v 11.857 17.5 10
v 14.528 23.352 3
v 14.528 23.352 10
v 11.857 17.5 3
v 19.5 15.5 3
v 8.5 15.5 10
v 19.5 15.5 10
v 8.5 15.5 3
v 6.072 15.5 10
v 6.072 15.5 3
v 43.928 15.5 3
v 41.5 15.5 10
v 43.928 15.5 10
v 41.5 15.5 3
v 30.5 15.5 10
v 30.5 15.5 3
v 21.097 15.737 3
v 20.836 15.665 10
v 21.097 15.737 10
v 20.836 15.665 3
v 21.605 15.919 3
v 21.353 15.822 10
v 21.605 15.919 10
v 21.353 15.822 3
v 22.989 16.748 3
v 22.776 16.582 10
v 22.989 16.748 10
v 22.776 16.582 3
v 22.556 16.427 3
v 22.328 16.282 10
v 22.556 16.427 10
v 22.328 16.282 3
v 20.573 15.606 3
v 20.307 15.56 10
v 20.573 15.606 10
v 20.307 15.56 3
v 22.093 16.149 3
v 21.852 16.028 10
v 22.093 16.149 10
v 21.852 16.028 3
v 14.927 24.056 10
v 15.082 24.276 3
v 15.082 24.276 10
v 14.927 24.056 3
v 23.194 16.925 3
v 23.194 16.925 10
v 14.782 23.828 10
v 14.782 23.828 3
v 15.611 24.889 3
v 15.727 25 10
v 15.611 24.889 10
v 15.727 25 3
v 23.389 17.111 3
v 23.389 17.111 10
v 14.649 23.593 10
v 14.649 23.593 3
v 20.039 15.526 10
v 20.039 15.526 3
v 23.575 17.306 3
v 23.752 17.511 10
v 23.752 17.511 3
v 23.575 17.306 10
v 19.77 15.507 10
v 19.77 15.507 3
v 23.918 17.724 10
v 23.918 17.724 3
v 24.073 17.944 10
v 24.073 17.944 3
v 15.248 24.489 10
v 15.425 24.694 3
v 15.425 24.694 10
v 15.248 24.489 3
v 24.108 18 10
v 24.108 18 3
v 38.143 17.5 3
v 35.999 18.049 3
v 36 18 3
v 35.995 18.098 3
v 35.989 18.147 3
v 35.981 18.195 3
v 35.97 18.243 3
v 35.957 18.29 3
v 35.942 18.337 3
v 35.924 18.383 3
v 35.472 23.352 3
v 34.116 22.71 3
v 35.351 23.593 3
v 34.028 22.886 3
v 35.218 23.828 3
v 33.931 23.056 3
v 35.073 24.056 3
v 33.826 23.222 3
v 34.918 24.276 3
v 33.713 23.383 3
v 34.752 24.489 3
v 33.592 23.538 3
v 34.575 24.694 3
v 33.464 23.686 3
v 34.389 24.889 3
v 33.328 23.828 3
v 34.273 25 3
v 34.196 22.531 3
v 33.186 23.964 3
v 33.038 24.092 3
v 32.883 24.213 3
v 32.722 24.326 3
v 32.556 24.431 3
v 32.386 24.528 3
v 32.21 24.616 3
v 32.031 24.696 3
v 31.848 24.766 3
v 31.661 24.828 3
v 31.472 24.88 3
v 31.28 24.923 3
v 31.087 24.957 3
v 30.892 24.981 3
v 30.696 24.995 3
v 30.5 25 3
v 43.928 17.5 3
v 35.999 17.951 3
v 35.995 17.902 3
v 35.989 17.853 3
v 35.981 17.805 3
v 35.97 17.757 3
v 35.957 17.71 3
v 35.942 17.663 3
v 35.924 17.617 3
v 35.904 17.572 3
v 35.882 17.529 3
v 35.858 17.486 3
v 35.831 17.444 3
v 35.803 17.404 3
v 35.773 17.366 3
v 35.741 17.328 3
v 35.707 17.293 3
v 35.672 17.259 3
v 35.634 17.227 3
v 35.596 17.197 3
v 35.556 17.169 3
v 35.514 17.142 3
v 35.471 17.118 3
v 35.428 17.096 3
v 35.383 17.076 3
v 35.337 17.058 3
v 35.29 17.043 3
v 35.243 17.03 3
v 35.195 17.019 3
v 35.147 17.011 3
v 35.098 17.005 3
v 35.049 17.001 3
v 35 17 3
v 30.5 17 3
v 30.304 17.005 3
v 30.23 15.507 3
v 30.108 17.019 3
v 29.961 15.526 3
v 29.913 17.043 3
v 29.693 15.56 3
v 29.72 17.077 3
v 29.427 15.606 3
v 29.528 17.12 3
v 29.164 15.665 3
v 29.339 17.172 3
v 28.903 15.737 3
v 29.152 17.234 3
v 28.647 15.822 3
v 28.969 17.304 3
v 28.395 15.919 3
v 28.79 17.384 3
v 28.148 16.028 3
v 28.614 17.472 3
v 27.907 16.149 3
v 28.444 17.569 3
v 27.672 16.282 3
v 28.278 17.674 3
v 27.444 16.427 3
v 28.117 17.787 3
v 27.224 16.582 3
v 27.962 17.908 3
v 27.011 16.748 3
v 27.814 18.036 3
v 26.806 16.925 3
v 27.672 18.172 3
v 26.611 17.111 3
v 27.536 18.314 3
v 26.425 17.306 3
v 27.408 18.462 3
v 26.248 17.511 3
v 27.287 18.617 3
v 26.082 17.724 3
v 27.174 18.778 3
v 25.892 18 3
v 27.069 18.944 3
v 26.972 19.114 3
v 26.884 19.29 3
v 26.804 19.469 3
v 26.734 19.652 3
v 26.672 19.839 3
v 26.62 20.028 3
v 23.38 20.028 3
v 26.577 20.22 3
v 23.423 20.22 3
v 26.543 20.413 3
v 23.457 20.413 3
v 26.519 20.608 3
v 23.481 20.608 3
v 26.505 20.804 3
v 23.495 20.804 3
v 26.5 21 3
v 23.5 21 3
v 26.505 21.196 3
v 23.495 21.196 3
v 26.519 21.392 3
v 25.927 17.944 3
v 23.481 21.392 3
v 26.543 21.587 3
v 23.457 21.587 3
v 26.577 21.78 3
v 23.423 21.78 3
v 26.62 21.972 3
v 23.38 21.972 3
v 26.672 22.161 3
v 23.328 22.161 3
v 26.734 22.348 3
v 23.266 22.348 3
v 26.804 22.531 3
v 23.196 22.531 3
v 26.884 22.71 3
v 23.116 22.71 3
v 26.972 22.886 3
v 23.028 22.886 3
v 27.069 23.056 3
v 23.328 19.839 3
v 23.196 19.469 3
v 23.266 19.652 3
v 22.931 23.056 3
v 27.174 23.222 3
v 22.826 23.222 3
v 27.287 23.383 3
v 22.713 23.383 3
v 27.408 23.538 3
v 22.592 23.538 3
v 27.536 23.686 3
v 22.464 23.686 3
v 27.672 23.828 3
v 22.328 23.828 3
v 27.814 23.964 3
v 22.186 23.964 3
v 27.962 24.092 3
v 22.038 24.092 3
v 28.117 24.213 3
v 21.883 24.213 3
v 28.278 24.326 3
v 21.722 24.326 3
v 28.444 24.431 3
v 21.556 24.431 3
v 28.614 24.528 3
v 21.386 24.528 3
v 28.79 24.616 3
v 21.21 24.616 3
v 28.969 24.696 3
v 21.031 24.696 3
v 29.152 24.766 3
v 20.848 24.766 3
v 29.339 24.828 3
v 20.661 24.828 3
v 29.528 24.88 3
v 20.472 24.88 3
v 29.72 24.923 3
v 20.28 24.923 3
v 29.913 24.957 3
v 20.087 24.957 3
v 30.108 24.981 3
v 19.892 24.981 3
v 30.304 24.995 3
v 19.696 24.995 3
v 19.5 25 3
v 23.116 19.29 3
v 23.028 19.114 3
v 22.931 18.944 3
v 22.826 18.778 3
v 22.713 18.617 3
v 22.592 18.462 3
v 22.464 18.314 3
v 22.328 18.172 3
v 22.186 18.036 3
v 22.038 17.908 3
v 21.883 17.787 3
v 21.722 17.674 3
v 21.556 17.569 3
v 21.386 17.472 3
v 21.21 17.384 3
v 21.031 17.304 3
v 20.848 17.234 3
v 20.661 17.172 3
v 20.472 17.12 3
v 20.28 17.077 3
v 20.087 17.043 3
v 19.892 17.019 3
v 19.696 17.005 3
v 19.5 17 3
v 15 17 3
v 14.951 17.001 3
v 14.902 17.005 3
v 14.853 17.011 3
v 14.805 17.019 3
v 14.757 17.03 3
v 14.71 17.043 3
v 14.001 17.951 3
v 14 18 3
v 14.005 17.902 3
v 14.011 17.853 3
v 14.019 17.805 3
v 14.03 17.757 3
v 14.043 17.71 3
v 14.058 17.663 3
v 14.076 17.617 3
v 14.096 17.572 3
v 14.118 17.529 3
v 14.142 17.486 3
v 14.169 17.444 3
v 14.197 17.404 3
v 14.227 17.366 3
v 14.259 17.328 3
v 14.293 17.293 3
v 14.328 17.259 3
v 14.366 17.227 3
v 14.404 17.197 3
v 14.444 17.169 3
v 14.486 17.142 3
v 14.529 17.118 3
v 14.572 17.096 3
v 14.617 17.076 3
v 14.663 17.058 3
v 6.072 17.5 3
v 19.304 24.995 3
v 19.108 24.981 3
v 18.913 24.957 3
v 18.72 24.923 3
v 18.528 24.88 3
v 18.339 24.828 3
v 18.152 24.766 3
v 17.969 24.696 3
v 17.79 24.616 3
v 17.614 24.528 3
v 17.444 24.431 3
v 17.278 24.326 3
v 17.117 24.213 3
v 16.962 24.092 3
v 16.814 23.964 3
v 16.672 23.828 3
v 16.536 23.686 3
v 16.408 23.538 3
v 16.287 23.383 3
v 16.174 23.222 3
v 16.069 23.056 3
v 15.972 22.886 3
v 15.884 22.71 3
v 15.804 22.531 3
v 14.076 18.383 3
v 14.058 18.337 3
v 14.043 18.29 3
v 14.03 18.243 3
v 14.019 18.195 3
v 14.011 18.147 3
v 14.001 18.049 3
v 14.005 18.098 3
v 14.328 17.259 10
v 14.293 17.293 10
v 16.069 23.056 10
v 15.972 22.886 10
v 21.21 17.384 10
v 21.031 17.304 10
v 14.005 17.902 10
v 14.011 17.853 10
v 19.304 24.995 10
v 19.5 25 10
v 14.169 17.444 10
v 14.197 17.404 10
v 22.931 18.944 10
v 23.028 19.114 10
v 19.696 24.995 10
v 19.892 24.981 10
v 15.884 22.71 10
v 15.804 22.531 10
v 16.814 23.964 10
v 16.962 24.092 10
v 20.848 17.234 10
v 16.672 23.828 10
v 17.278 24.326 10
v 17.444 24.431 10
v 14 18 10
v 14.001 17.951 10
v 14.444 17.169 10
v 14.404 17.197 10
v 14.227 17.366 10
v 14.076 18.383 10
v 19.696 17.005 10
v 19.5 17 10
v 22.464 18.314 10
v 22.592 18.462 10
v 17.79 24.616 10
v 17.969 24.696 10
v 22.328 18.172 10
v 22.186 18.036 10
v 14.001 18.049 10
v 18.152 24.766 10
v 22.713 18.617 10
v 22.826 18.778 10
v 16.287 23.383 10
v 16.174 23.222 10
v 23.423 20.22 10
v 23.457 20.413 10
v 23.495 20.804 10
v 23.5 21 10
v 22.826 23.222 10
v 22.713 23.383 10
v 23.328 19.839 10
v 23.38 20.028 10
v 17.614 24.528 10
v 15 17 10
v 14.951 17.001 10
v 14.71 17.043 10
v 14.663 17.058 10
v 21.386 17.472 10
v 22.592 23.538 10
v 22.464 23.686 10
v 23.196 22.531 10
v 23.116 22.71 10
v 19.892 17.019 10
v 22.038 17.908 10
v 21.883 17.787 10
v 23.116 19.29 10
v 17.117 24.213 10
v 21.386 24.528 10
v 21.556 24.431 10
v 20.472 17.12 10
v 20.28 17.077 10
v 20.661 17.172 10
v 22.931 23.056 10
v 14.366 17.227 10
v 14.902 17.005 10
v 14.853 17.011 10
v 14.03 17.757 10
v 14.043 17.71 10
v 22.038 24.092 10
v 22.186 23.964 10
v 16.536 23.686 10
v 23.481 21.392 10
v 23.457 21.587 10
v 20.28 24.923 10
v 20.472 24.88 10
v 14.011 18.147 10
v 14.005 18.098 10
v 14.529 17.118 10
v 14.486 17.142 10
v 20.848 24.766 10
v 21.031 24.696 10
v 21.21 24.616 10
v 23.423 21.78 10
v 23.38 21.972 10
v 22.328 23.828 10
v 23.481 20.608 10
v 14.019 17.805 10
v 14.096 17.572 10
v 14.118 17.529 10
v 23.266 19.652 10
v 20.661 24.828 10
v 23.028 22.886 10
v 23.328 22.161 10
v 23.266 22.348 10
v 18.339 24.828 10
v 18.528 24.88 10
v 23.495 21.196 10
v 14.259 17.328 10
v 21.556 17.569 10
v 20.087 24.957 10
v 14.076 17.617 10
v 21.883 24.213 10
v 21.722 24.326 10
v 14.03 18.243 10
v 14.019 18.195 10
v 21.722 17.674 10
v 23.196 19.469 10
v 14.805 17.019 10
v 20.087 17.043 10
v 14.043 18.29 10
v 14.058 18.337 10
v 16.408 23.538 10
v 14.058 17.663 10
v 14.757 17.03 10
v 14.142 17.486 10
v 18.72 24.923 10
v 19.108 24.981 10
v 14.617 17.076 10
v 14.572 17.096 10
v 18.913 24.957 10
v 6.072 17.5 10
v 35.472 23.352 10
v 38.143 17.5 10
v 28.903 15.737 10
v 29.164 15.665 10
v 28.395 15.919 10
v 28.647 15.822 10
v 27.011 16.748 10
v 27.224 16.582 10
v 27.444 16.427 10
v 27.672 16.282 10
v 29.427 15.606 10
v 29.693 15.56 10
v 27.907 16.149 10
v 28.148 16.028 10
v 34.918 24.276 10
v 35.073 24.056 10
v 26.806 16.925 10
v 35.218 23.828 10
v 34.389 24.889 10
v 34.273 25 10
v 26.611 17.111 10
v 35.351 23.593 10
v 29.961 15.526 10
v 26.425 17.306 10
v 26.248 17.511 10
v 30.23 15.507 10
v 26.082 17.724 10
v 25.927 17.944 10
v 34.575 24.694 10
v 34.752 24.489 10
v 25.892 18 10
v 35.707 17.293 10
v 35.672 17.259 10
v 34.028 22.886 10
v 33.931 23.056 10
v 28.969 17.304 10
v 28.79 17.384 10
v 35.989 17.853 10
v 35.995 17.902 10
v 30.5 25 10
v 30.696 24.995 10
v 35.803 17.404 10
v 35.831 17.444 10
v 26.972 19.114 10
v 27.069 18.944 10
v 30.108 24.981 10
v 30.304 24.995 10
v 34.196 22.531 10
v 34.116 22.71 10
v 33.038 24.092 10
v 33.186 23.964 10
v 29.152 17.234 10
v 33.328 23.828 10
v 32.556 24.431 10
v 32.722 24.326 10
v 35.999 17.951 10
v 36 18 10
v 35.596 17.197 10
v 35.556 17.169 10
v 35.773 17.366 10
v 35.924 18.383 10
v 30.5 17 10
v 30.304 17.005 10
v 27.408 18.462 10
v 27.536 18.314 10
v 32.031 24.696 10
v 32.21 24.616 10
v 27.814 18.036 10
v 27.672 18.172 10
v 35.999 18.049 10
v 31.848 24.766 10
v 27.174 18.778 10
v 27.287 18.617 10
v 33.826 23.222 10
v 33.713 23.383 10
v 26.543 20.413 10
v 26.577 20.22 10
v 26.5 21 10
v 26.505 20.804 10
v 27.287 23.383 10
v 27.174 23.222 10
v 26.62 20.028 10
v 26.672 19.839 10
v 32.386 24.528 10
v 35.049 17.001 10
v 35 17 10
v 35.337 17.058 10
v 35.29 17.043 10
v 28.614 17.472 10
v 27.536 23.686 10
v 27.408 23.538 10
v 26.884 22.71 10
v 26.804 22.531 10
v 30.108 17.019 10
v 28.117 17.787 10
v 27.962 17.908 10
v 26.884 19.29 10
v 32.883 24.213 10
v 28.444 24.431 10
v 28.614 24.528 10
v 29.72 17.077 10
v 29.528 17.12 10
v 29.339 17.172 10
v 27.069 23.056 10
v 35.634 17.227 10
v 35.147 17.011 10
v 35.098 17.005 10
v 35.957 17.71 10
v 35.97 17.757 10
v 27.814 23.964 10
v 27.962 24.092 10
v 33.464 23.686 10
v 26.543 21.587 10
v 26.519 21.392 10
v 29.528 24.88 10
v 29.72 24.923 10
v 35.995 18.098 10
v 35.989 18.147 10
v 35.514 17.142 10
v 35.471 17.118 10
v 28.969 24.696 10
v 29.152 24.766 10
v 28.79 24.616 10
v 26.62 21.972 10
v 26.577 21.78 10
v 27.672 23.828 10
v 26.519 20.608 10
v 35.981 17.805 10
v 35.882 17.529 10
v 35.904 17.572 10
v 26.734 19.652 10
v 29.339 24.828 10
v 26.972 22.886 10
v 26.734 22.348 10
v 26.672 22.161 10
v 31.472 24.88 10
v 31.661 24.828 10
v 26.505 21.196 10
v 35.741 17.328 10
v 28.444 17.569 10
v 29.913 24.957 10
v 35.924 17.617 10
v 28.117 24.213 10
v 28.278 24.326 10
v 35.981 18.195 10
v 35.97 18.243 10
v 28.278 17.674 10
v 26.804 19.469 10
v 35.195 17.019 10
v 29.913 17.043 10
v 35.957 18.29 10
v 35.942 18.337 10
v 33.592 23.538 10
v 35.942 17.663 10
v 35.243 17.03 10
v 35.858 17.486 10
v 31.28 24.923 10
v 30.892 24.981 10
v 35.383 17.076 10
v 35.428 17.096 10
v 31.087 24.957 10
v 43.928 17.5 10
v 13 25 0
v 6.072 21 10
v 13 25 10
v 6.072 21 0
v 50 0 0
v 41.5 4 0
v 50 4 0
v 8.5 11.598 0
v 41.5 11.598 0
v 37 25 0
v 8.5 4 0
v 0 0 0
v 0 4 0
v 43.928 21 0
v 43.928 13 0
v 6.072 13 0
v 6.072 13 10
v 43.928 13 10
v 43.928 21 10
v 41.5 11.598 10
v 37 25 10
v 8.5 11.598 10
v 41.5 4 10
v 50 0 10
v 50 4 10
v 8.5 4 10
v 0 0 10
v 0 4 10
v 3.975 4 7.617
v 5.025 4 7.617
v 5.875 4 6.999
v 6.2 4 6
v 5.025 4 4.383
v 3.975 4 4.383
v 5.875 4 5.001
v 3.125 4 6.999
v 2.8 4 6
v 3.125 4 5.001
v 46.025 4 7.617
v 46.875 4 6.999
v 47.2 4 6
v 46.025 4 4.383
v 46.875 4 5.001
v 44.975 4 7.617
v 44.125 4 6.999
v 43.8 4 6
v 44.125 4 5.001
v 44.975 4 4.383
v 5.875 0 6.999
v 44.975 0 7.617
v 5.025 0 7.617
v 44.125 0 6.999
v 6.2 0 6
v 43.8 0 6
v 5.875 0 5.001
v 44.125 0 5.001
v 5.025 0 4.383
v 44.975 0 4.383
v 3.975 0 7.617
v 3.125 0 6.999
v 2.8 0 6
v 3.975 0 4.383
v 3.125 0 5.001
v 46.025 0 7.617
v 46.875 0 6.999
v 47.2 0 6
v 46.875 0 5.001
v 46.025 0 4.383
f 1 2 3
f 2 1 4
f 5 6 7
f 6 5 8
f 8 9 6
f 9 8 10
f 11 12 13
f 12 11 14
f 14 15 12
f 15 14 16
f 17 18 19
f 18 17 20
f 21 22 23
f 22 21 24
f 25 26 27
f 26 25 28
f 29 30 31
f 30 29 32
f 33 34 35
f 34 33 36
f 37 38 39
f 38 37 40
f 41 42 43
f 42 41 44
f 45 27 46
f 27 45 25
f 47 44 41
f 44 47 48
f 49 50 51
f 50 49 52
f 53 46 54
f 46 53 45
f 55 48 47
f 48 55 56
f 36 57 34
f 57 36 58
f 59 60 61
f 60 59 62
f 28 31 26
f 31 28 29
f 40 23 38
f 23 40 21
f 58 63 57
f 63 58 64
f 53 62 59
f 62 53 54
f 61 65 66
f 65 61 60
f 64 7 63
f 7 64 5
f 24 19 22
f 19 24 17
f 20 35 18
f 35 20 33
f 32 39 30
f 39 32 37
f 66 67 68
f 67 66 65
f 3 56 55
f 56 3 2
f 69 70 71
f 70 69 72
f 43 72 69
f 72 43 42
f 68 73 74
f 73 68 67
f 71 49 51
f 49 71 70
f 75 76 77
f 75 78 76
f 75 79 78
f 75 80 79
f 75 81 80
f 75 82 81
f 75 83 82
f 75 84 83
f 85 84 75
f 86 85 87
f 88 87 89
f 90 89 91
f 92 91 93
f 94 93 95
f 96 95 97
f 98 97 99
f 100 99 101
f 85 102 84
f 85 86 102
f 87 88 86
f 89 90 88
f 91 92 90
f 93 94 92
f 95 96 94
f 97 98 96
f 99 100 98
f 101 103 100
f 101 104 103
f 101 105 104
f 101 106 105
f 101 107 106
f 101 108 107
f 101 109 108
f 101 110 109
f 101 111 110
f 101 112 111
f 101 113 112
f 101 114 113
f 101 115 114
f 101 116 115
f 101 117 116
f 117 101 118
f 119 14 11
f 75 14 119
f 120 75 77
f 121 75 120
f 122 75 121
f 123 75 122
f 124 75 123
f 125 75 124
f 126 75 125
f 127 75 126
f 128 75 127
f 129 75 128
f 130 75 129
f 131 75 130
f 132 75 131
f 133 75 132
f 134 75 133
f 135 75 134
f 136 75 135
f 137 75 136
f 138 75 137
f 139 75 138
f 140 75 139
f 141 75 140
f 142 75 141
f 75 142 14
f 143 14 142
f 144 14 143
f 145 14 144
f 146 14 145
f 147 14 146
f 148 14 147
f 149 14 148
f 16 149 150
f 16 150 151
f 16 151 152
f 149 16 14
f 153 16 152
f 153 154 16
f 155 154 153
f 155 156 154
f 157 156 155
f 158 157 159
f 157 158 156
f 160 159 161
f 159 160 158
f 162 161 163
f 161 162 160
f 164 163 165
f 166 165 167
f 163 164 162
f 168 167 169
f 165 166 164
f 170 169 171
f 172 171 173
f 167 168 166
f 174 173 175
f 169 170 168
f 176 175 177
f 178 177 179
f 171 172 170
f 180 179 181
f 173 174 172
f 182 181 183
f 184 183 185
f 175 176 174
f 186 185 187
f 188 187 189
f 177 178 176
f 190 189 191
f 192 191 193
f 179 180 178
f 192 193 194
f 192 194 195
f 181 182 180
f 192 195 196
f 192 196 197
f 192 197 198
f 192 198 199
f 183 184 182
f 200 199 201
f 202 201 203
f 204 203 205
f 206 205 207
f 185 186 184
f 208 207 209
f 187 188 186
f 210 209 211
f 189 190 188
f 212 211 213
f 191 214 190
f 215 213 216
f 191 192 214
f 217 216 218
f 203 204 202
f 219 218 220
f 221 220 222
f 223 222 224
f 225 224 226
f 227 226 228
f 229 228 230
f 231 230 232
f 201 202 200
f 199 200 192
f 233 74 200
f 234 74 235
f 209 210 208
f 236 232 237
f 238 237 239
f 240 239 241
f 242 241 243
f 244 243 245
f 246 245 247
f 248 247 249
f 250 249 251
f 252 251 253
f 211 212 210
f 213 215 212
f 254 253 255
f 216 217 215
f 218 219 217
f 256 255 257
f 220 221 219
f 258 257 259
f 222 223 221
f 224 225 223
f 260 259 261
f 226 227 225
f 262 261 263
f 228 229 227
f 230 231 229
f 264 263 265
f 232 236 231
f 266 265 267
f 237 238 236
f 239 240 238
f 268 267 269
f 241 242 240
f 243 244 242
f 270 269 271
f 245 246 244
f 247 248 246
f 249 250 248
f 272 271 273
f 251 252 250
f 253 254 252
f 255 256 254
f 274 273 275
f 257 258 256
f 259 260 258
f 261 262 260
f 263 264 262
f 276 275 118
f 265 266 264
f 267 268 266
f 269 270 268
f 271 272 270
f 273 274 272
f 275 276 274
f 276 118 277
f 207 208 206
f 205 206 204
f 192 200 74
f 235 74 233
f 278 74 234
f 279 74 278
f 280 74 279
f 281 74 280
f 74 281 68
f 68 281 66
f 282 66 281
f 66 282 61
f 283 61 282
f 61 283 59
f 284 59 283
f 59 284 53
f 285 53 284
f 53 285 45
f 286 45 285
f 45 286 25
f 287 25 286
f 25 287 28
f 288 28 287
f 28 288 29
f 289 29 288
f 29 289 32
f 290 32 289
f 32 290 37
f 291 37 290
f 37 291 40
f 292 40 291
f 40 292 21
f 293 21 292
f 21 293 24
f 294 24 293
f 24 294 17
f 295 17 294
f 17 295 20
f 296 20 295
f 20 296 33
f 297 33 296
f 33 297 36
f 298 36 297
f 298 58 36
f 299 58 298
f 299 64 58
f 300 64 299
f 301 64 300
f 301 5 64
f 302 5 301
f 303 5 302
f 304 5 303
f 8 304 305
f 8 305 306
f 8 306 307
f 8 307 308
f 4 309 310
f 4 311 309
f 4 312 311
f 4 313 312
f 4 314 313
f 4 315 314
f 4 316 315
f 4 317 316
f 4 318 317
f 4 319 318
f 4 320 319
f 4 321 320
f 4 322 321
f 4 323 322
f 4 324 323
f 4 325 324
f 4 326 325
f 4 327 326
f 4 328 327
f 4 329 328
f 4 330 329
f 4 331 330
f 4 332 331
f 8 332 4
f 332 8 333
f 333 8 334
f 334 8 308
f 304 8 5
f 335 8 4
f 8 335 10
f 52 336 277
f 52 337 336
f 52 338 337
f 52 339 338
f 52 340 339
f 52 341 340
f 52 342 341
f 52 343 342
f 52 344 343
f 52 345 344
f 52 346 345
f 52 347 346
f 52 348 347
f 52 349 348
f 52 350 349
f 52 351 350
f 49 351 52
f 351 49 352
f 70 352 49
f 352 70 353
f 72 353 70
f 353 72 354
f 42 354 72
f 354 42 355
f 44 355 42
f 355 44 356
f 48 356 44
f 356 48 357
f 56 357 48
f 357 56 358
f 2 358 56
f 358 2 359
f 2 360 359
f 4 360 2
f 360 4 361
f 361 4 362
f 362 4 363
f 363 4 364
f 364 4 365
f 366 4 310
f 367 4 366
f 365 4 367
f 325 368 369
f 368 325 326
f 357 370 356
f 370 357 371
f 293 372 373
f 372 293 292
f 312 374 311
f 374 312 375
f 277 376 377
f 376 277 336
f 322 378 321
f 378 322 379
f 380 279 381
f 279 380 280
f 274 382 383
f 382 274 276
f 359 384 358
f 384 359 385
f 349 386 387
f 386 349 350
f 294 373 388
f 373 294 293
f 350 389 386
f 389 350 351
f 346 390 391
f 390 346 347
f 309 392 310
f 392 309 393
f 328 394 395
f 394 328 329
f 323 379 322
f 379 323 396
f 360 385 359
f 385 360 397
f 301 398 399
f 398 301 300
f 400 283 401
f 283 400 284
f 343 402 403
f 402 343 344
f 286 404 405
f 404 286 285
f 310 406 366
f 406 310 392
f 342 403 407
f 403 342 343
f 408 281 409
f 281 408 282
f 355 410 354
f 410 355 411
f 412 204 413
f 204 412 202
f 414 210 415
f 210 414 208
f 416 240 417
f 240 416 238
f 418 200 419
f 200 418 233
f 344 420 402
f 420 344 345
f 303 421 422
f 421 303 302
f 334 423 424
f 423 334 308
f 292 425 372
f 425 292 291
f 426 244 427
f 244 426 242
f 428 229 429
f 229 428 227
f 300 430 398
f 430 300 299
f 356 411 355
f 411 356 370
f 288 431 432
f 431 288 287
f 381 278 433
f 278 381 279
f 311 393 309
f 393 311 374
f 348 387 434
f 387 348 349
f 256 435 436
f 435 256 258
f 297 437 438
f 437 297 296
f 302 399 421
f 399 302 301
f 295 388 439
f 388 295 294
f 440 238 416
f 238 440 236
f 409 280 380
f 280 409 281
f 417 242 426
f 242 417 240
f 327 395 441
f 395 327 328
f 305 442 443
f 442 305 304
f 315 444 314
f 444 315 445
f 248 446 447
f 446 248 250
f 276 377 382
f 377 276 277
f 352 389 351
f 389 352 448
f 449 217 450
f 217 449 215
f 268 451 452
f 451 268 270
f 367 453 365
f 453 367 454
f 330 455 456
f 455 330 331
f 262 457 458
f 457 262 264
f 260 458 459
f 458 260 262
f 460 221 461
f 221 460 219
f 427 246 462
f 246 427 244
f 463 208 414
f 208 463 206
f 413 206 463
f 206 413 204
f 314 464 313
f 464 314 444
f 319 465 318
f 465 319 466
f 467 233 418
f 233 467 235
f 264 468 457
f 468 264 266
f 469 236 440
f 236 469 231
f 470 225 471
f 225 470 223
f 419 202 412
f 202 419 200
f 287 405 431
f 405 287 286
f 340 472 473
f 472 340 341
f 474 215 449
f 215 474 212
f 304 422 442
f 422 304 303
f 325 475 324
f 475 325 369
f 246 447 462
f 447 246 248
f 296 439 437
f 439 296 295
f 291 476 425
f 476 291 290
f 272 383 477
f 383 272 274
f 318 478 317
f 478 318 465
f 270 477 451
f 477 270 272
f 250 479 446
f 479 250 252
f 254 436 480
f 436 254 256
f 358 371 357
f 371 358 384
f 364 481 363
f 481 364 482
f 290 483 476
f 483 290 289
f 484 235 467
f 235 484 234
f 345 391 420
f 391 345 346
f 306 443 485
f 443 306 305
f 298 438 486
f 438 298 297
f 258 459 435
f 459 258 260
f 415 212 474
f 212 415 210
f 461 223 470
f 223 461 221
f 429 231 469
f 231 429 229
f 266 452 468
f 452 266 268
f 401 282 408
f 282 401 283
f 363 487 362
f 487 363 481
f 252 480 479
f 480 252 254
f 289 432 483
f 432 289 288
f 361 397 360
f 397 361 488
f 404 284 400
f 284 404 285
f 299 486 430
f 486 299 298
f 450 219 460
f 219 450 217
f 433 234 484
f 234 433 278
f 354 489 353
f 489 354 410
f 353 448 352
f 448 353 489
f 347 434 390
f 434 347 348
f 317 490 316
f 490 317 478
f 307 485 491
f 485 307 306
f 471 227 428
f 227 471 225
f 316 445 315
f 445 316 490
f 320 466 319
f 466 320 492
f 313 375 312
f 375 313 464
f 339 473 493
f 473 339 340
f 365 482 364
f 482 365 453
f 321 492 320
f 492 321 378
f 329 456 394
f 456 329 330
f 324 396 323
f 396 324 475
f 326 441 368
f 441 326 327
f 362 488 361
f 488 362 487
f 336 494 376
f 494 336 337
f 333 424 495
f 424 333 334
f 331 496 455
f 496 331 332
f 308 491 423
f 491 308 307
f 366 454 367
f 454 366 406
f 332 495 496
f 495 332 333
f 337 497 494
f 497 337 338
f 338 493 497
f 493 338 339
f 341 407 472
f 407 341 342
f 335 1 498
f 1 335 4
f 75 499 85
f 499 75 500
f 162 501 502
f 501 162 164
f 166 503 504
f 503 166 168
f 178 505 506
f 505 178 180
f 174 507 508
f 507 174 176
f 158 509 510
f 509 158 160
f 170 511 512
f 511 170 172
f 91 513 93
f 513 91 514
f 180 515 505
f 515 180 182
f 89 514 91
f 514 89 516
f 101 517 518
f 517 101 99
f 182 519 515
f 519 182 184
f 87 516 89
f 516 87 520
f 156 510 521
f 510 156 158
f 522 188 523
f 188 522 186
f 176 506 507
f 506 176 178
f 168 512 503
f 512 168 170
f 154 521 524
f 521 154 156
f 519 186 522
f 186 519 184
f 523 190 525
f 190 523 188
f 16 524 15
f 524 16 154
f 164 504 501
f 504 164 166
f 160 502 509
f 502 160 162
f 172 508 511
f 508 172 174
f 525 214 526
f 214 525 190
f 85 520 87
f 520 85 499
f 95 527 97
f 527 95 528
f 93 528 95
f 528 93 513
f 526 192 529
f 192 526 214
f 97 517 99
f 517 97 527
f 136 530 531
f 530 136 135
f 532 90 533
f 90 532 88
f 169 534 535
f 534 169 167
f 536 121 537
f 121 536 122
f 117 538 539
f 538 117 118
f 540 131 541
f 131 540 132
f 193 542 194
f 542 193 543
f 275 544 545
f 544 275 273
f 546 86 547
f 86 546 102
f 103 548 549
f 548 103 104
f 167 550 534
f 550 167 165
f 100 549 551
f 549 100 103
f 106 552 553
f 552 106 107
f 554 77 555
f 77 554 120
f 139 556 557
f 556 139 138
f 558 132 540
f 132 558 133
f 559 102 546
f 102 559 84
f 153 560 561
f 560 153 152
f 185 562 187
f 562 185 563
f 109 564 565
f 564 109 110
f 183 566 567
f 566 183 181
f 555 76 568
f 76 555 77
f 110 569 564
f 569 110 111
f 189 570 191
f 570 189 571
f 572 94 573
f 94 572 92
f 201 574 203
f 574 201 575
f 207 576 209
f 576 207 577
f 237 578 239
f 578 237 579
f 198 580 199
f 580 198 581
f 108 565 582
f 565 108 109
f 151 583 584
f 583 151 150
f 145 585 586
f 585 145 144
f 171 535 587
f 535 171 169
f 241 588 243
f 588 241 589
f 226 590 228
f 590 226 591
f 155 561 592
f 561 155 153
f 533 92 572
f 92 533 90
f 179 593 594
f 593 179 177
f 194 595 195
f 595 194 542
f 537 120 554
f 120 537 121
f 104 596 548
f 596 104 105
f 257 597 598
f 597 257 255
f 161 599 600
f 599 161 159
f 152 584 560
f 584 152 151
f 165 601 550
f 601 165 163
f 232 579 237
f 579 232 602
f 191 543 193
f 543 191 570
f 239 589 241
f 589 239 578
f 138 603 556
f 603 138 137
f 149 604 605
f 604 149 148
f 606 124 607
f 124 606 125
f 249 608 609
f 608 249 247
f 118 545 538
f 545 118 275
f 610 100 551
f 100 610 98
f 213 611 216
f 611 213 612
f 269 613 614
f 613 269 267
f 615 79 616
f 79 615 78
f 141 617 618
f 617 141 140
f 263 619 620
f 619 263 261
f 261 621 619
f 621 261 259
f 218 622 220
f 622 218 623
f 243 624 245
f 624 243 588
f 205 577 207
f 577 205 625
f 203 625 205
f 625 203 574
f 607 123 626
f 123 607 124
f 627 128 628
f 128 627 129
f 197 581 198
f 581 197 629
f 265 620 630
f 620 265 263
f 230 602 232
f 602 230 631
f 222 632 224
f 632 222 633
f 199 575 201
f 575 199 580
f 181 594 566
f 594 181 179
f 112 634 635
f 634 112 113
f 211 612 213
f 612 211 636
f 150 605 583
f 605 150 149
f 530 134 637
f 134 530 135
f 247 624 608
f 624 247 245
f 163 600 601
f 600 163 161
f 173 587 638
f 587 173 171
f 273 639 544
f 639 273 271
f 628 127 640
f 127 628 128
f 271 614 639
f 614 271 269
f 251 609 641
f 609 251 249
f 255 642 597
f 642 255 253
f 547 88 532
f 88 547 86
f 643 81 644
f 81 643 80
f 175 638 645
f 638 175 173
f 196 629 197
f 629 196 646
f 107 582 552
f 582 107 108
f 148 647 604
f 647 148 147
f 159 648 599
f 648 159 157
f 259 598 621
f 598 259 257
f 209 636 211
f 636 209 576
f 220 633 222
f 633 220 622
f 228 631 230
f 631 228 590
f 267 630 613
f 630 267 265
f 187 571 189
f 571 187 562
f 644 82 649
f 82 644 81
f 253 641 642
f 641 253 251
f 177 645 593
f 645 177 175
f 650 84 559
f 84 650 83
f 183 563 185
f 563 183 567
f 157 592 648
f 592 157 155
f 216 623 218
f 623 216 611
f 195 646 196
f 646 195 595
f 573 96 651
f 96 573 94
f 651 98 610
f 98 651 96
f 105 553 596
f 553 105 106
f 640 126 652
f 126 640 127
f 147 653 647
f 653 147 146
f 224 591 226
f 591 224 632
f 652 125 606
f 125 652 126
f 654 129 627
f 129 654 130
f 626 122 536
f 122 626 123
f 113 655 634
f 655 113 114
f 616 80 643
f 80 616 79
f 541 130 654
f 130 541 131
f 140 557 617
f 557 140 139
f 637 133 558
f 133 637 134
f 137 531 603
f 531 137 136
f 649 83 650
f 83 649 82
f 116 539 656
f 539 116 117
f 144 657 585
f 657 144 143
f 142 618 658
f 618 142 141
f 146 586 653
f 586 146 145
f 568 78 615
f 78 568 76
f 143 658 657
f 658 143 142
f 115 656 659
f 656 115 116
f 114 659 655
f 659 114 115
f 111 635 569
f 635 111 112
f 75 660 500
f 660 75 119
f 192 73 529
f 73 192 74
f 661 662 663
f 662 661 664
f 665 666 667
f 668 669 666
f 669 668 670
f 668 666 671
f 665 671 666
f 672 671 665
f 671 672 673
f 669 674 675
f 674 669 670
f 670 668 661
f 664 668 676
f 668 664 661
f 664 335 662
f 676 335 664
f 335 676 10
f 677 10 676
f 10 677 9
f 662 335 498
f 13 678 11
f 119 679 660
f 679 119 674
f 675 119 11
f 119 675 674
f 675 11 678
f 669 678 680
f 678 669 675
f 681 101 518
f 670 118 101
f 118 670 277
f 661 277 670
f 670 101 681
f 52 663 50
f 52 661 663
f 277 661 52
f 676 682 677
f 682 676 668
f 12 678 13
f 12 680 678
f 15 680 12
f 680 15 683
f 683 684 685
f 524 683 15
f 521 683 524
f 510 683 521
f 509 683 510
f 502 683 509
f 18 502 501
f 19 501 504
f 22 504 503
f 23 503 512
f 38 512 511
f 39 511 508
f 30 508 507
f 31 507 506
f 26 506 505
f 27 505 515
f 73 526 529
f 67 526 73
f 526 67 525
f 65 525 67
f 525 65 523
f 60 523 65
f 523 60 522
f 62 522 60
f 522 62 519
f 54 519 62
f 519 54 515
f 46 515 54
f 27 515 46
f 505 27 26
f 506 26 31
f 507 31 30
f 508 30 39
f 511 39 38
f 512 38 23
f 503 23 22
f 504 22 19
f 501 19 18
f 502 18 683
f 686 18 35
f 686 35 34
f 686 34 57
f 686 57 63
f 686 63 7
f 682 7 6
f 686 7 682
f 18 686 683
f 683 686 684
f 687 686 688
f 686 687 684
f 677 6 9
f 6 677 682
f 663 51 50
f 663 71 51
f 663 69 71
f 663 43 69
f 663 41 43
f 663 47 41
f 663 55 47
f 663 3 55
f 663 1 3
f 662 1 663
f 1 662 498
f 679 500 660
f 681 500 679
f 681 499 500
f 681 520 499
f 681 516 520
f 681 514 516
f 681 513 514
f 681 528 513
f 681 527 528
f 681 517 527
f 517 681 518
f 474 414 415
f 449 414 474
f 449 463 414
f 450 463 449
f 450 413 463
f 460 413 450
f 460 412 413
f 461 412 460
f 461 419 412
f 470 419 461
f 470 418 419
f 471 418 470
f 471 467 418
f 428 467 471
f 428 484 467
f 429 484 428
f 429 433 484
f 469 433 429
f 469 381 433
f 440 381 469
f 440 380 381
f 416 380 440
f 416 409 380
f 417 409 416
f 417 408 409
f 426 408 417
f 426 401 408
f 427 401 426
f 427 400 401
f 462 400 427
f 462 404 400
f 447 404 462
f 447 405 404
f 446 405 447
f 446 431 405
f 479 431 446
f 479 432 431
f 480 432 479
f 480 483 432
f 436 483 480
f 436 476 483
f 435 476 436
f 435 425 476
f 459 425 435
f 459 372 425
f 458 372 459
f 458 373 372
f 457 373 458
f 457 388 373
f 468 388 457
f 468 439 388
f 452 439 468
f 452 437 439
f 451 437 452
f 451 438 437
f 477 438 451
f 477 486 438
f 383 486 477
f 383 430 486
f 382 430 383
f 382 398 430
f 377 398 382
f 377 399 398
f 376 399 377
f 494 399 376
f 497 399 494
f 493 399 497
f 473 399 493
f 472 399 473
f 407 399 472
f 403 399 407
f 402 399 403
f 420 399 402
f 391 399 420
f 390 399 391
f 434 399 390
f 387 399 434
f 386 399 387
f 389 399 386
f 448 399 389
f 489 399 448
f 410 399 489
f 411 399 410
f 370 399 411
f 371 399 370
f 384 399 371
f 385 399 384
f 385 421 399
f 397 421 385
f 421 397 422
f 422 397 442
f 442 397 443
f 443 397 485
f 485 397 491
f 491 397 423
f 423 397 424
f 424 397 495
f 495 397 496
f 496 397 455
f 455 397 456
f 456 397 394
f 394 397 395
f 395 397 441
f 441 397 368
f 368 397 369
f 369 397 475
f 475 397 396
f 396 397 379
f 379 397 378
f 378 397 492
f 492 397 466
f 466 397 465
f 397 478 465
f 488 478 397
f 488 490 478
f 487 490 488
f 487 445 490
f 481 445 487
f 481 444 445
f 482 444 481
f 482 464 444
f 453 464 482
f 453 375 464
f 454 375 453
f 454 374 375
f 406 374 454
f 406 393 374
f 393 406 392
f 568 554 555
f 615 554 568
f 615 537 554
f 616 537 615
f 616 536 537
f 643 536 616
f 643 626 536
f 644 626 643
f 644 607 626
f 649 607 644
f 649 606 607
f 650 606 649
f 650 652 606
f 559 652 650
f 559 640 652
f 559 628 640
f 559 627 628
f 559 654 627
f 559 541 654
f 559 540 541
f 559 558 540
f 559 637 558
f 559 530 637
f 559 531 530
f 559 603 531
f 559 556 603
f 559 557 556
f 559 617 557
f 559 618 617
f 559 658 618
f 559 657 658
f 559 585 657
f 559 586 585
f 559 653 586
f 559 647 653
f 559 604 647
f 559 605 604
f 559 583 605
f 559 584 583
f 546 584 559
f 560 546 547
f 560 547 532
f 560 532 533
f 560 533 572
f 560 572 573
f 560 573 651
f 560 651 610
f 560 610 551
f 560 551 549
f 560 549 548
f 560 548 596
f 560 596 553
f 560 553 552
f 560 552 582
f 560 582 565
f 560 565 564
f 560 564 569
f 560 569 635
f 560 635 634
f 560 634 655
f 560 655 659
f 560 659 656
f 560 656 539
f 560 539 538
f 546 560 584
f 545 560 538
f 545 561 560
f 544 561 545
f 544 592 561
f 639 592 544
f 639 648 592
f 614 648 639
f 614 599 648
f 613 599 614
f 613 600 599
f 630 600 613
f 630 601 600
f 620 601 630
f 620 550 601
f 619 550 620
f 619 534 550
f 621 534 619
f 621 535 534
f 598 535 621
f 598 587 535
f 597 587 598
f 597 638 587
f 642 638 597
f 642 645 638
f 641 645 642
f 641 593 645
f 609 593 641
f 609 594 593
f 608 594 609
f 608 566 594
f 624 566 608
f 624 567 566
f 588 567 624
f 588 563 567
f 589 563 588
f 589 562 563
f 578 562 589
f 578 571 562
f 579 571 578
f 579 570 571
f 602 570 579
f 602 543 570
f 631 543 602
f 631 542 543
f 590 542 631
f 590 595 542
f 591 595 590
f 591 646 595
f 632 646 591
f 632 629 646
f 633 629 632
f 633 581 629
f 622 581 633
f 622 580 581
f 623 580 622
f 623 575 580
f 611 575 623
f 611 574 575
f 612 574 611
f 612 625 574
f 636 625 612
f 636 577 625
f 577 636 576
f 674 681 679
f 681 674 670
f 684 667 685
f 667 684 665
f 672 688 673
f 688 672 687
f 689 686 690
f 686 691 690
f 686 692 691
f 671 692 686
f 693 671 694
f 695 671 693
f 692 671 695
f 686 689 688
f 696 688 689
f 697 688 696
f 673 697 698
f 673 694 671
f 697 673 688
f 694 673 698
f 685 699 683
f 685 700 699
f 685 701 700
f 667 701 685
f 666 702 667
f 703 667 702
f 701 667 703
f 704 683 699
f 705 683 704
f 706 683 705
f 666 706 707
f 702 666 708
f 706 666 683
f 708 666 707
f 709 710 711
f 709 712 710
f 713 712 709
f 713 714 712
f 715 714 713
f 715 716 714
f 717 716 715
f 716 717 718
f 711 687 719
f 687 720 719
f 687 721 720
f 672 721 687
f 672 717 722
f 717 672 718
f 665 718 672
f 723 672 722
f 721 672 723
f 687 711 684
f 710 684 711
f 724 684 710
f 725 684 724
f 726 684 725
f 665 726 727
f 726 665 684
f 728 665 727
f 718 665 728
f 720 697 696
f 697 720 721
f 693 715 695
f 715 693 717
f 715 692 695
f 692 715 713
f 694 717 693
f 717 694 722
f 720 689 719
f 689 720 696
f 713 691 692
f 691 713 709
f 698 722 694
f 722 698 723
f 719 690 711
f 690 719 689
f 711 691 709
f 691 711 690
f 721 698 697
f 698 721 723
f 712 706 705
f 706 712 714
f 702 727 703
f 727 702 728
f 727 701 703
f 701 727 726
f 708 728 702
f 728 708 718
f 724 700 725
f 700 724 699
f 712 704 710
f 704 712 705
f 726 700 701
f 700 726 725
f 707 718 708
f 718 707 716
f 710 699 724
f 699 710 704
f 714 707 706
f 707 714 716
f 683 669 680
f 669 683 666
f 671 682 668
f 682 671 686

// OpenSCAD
$fn=32 * 4;

platformHeight = 15.5; //clearance between y carriage and belt. Default 15.5mm fits for my Prusa i3. 

module beltClamp(){
    module frame(){
        hull(){
            translate([7,8,0]) rotate([0,0,30]) cylinder(10,8,8,$fn=6);
            translate([31,8,0]) rotate([0,0,30]) cylinder(10,8,8,$fn=6);
        }
    }
    module beltLoop(){
        difference(){
            hull(){
                translate([6.5,1,0]) cylinder(h = 12, r1 = 1, r2 = 1);
                translate([13.5,5.5,0]) cylinder(h = 12, r1 = 5.5, r2 = 5.5);
            }
            hull(){
                translate([9,2.5,0]) cylinder(h = 12, r1 = 1, r2 = 1);
                translate([13.5,5.5,0]) cylinder(h = 12, r1 = 4, r2 = 4);
            }
        }
        cube([8,2,12]);
    }
    module beltOpening(){
        beltLoop();
        translate([38,0,0]) mirror(1,0,0) beltLoop();
        translate([17.5,2.5,0]) cube([3,8,12]);
        translate([19,7,0]) rotate([0,0,45]) cube([4,4,12]);
    }
    difference(){
        frame();
        translate([0,6.5,3]) beltOpening();
        }
}
module platform(){
    translate([8.5,0,-0]) cube([33,platformHeight,10]);
    difference(){
        translate([0,0,0]) cube([50,4,10]);
        translate([4.5,0,6]) rotate([-90,0,0]) cylinder(h=30, r=1.7, $fn=10);
        translate([45.5,0,6]) rotate([-90,0,0]) cylinder(h=30, r=1.7, $fn=10);
    }
}
translate([6,platformHeight-6.5,0]) beltClamp();
platform();
